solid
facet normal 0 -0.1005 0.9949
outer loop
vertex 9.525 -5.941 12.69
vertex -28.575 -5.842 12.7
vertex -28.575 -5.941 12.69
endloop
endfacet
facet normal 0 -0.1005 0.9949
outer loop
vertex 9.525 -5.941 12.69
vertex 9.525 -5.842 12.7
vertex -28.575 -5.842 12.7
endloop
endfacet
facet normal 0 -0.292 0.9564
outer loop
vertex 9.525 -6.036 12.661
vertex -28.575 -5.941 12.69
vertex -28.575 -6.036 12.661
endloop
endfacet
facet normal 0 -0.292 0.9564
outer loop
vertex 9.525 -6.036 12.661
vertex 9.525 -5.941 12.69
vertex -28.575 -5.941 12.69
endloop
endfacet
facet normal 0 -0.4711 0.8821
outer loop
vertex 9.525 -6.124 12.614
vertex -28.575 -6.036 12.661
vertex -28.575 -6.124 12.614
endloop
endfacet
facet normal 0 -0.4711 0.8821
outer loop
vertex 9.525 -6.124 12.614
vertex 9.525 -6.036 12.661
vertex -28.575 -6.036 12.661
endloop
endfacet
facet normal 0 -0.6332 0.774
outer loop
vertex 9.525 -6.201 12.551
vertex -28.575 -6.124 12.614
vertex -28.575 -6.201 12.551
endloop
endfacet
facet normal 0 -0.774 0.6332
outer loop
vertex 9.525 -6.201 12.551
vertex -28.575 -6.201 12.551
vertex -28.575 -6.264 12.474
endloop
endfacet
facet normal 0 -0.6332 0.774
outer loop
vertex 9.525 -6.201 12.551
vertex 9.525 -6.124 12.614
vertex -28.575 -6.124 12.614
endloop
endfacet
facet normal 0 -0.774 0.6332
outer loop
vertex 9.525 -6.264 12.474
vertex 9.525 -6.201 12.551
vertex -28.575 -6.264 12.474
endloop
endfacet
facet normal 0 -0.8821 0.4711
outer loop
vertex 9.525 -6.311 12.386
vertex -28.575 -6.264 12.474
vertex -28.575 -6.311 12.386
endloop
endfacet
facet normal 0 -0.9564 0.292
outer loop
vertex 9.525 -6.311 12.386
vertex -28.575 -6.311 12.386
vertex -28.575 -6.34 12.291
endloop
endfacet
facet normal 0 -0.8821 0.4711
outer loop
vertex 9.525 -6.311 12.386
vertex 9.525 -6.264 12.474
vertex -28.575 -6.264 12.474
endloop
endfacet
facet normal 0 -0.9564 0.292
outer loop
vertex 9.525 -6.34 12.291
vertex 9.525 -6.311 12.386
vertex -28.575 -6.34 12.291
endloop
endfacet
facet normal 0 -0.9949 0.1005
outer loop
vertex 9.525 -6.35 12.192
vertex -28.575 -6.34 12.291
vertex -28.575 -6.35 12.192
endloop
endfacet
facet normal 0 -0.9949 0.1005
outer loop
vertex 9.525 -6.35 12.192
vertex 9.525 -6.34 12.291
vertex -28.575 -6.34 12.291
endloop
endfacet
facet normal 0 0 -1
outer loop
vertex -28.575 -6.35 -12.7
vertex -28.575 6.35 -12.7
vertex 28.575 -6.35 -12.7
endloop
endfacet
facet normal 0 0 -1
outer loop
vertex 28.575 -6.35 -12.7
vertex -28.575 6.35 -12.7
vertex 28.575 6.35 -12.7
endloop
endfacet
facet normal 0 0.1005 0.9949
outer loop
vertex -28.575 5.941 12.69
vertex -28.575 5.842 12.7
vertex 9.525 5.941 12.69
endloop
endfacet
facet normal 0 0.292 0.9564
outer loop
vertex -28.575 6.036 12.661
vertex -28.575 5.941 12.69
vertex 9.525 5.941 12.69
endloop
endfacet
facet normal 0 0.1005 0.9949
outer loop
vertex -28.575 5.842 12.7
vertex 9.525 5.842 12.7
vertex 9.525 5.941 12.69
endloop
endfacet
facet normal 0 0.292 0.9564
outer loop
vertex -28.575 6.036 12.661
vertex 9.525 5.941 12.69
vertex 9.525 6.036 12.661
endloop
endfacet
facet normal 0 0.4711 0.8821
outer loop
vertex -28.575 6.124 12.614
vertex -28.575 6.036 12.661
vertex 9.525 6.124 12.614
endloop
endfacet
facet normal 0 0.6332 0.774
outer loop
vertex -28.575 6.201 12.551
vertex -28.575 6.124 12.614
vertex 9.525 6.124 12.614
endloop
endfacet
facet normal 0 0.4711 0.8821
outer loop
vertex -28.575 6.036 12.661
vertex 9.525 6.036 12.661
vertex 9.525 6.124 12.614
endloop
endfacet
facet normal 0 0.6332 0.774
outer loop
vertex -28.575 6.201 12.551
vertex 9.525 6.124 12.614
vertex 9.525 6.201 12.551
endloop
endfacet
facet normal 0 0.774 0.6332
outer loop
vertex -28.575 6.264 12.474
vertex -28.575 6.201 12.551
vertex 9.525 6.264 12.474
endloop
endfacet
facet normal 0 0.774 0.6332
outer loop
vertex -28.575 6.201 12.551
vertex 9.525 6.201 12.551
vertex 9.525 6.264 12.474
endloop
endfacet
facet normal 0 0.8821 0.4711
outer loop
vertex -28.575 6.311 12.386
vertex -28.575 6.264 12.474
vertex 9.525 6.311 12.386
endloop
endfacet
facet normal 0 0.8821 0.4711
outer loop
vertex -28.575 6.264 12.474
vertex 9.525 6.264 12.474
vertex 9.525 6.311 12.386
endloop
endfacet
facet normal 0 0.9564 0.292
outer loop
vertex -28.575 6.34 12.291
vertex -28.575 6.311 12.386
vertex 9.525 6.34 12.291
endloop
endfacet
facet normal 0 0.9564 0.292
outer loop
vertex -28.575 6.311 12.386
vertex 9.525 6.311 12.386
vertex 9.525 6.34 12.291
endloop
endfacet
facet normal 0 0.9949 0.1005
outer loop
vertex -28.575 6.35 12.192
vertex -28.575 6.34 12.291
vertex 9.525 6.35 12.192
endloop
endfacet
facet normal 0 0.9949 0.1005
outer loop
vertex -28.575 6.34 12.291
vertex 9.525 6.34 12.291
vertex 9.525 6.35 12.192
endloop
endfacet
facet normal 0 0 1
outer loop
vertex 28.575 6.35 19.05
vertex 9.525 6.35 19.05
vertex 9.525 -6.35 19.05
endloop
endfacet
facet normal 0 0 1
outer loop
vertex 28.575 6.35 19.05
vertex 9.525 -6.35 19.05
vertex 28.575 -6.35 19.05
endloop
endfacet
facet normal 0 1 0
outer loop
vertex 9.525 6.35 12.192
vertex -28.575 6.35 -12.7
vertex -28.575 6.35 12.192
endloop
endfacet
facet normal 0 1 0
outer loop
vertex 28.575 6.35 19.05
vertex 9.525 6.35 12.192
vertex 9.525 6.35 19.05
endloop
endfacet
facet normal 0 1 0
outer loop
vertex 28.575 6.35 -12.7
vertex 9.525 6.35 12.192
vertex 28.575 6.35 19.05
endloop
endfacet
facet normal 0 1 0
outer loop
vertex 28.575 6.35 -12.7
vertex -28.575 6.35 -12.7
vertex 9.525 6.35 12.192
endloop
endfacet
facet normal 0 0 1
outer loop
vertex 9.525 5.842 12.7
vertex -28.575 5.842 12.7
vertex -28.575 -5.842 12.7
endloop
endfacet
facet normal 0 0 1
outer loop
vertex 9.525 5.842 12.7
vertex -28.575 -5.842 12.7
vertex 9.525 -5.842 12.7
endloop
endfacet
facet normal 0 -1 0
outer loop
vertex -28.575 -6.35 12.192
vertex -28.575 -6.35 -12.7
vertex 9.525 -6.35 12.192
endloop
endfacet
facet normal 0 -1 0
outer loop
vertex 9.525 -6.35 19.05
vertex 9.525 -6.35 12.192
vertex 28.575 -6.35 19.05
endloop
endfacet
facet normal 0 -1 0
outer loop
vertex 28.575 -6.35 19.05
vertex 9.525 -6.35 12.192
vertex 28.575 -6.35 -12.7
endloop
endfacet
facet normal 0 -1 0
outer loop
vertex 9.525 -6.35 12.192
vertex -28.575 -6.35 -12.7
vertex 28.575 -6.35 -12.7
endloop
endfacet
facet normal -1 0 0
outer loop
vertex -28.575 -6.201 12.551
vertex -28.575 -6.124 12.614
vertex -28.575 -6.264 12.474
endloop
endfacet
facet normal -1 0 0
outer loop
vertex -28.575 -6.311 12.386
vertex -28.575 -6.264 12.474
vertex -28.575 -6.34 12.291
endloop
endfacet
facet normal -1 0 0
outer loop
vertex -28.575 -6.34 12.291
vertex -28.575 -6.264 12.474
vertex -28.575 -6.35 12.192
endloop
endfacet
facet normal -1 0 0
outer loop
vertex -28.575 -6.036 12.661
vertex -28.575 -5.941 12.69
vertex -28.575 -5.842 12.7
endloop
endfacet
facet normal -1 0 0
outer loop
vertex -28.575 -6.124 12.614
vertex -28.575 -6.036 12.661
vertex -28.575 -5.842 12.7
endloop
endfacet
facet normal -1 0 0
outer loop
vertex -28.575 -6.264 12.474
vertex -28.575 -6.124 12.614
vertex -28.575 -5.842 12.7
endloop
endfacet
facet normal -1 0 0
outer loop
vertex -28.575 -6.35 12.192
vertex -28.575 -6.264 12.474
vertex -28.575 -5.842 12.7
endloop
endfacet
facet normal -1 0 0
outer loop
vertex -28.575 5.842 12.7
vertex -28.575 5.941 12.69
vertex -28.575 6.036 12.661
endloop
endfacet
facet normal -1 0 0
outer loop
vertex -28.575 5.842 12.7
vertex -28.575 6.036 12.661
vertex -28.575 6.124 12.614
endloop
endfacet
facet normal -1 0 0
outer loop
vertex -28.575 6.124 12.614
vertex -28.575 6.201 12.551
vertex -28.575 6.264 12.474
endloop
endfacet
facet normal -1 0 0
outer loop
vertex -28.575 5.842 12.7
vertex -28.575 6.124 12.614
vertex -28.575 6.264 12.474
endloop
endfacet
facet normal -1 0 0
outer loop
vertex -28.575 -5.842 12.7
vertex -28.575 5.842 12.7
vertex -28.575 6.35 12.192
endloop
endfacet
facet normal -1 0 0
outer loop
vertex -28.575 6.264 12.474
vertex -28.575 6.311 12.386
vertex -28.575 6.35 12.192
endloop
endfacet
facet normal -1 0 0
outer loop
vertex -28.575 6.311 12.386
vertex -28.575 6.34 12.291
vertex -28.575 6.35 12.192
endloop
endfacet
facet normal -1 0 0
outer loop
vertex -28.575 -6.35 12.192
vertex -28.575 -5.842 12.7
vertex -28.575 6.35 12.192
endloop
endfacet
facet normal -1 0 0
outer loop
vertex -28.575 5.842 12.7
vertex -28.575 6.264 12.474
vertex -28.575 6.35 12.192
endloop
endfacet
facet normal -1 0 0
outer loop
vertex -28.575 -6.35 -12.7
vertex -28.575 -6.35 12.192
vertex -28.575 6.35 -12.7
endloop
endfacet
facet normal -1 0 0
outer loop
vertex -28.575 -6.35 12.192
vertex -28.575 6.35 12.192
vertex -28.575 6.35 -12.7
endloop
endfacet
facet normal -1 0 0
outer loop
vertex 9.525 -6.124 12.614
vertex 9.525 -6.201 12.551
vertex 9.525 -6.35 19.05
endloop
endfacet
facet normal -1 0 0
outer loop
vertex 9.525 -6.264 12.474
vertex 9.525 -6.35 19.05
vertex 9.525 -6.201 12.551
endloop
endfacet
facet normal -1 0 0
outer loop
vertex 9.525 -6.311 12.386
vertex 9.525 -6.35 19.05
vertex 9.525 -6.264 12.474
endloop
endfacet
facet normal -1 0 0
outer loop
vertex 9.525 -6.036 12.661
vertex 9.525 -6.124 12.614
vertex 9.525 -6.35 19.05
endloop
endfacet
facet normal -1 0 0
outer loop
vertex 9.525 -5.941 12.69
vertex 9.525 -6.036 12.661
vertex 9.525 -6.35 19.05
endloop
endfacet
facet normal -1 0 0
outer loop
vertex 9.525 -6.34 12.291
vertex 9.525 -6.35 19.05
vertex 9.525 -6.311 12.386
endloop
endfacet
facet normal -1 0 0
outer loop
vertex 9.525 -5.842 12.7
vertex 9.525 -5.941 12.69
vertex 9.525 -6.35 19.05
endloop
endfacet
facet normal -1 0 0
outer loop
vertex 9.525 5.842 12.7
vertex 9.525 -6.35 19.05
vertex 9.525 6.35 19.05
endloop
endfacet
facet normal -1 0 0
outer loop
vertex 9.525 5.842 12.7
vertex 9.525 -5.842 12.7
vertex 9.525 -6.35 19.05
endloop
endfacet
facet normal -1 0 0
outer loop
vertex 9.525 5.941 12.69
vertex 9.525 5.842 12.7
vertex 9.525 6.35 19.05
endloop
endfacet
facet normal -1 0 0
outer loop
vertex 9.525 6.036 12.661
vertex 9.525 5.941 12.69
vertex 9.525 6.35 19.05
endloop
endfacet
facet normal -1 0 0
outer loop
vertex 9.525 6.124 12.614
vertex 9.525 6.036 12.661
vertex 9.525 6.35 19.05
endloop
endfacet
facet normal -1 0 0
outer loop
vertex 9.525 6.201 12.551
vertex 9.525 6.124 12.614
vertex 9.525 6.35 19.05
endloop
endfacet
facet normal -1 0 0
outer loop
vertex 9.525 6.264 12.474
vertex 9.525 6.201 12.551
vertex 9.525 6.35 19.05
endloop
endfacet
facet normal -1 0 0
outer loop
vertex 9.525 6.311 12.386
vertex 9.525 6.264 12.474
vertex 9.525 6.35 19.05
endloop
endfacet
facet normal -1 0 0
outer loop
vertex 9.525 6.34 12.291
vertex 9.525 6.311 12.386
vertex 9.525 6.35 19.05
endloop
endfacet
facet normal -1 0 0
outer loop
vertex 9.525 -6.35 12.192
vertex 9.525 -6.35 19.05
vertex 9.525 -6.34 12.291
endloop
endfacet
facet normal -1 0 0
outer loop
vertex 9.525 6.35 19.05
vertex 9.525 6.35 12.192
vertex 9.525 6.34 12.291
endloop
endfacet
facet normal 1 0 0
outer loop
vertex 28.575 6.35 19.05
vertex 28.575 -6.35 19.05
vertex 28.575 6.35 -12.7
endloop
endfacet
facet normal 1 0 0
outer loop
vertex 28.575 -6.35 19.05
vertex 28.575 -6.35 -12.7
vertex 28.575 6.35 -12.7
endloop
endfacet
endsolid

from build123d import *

# Parameters (mm, degrees)
SKETCH1_W           = 57.15
SKETCH1_H           = 25.4
BOSS_EXTRUDE1_DEPTH = 6.35
SKETCH2_W           = 19.05
SKETCH2_H           = 12.7
BOSS_EXTRUDE2_DEPTH = 6.35
FILLET1_R           = 0.508


with BuildPart() as part:
    # Sketch1 → Boss-Extrude1 (new, symmetric)
    with BuildSketch(Plane(origin=(0, 0, 0), x_dir=(1, 0, 0), z_dir=(0, 1, 0))):
        Rectangle(SKETCH1_W, SKETCH1_H)
    extrude(amount=BOSS_EXTRUDE1_DEPTH, both=True)

    # Sketch2 → Boss-Extrude2 (add)
    with BuildSketch(Plane.XY.offset(12.7)):
        with Locations((19.05, 0)):
            Rectangle(SKETCH2_W, SKETCH2_H)
    extrude(amount=BOSS_EXTRUDE2_DEPTH)

    # Fillet1
    fillet1_edges = [part.edges().sort_by_distance(p)[0] for p in [
        (-9.525, 6.35, 12.7),
        (-9.525, -6.35, 12.7),
    ]]
    fillet(fillet1_edges, radius=FILLET1_R)


solid = part.part
